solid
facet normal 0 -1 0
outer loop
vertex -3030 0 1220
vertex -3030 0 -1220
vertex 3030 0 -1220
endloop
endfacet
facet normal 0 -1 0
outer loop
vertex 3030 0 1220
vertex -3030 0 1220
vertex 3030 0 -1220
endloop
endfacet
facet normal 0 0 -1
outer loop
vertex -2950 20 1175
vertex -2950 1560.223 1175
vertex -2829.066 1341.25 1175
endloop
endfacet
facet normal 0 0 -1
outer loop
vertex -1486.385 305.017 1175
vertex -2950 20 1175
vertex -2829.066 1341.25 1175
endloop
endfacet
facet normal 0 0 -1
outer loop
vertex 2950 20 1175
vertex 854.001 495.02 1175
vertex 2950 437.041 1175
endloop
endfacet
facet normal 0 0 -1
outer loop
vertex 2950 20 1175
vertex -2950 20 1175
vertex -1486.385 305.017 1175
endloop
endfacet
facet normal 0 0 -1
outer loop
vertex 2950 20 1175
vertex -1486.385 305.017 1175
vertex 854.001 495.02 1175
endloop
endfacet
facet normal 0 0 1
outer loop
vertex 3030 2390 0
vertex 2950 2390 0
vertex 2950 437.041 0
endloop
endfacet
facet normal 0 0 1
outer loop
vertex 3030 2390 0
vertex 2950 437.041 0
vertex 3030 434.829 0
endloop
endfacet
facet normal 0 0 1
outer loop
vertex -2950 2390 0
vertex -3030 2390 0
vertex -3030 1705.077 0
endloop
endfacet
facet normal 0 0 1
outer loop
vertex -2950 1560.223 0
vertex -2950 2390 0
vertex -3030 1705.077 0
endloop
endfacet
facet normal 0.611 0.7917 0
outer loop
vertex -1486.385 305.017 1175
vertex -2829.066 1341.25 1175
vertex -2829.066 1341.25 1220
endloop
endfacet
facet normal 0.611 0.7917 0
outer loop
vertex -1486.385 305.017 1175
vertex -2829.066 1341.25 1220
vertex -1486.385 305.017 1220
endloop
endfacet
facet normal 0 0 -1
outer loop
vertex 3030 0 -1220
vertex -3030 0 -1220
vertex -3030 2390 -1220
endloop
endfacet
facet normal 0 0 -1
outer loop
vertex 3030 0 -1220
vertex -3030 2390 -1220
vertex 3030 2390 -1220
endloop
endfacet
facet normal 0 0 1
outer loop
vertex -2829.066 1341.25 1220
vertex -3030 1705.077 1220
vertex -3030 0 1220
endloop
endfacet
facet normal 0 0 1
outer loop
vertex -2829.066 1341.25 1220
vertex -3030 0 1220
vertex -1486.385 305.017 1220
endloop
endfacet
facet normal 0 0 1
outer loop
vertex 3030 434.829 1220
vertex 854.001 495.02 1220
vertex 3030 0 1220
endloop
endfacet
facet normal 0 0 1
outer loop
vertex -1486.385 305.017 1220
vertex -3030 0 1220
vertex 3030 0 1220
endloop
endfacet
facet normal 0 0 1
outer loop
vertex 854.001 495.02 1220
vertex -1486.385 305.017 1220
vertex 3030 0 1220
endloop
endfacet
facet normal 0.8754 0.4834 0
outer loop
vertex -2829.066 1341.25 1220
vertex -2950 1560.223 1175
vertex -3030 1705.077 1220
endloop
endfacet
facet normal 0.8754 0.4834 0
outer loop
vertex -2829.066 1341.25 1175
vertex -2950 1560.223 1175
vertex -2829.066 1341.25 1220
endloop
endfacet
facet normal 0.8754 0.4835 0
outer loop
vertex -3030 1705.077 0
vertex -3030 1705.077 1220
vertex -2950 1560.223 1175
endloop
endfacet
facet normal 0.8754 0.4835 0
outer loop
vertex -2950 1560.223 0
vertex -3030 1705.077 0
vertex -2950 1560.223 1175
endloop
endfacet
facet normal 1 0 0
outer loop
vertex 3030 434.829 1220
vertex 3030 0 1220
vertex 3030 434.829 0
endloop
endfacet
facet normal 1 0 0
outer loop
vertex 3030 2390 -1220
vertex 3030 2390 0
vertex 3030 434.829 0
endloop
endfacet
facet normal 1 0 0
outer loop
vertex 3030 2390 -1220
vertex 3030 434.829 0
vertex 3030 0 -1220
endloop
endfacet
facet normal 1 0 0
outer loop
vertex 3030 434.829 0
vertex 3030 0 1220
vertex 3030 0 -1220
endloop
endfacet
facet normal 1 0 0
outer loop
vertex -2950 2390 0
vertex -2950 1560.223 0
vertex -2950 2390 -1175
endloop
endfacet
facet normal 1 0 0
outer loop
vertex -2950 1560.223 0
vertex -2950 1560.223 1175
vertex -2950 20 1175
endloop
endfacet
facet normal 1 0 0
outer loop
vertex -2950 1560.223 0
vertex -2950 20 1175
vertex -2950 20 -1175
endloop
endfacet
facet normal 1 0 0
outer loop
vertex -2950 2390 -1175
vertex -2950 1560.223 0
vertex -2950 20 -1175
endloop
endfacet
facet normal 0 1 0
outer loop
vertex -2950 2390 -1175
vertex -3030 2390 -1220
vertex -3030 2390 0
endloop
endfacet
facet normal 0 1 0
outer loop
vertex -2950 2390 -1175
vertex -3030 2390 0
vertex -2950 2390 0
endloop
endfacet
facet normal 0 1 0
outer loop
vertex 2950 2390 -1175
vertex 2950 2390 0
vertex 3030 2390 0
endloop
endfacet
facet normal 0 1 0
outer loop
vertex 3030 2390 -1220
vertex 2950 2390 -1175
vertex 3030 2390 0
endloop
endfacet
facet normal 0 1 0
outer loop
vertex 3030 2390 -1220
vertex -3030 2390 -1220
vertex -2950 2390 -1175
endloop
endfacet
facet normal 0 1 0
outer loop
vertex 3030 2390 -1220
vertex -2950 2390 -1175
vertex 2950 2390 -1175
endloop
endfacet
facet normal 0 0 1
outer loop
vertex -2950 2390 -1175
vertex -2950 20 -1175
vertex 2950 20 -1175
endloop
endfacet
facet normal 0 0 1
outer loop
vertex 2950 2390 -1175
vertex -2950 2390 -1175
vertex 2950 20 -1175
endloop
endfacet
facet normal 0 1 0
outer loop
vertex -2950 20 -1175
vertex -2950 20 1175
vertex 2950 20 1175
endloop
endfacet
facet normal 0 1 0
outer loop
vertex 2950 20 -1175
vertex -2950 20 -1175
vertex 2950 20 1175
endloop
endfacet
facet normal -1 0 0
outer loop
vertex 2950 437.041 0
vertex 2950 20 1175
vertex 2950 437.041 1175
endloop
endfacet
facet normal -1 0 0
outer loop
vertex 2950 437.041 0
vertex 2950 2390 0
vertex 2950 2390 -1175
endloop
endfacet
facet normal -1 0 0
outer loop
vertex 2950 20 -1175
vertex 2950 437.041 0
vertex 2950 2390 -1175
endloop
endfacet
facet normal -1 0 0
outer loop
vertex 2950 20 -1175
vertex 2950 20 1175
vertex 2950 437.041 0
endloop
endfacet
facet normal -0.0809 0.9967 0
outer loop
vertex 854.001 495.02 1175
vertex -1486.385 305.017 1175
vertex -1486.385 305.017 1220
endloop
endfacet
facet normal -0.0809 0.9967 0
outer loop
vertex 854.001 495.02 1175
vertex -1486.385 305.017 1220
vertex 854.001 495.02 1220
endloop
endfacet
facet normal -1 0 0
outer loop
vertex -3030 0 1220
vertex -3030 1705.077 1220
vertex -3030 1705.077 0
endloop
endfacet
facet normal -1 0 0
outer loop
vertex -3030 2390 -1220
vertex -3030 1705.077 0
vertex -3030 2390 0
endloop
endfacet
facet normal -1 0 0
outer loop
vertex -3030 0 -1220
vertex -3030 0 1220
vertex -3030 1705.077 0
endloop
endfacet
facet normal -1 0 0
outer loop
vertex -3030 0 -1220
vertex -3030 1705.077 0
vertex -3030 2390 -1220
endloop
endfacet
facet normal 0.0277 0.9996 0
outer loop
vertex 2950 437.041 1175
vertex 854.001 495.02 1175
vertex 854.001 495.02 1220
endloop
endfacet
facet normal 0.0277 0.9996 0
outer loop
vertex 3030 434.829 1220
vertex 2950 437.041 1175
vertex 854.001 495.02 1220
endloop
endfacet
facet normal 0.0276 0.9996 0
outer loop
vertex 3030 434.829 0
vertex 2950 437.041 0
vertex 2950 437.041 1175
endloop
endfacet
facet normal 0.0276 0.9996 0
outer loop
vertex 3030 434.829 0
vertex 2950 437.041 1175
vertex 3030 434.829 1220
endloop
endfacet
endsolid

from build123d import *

# Parameters (mm, degrees)
SKETCH1_W           = 6060
SKETCH1_H           = 2440
SKETCH1_W_2         = 5900
SKETCH1_H_2         = 2350
BOSS_EXTRUDE1_DEPTH = 2390
CUT_EXTRUDE1_DEPTH  = 4048.394223448
SKETCH3_W           = 6060
SKETCH3_H           = 2440
BOSS_EXTRUDE2_DEPTH = 20


with BuildPart() as part:
    # Sketch1 → Boss-Extrude1 (new body)
    with BuildSketch(Plane(origin=(0, 0, 0), x_dir=(1, 0, 0), z_dir=(0, 1, 0))):
        Rectangle(SKETCH1_W, SKETCH1_H)
        Rectangle(SKETCH1_W_2, SKETCH1_H_2, mode=Mode.SUBTRACT)
    extrude(amount=BOSS_EXTRUDE1_DEPTH)

    # Sketch2 → Cut-Extrude1 (cut, through all)
    with BuildSketch(Plane.XY):
        Polygon((-2829.06610651, 1341.250261684), (-1486.384719245, 305.017377158), (854.001038063, 495.020178739), (4288.412334885, 400.018777949), (4288.412334885, 2458.605327612), (-3446.157527287, 2458.605327612), align=None)
    extrude(amount=CUT_EXTRUDE1_DEPTH, mode=Mode.SUBTRACT)

    # Sketch3 → Boss-Extrude2 (add)
    with BuildSketch(Plane.XZ):
        Rectangle(SKETCH3_W, SKETCH3_H)
    extrude(amount=-BOSS_EXTRUDE2_DEPTH)


solid = part.part
